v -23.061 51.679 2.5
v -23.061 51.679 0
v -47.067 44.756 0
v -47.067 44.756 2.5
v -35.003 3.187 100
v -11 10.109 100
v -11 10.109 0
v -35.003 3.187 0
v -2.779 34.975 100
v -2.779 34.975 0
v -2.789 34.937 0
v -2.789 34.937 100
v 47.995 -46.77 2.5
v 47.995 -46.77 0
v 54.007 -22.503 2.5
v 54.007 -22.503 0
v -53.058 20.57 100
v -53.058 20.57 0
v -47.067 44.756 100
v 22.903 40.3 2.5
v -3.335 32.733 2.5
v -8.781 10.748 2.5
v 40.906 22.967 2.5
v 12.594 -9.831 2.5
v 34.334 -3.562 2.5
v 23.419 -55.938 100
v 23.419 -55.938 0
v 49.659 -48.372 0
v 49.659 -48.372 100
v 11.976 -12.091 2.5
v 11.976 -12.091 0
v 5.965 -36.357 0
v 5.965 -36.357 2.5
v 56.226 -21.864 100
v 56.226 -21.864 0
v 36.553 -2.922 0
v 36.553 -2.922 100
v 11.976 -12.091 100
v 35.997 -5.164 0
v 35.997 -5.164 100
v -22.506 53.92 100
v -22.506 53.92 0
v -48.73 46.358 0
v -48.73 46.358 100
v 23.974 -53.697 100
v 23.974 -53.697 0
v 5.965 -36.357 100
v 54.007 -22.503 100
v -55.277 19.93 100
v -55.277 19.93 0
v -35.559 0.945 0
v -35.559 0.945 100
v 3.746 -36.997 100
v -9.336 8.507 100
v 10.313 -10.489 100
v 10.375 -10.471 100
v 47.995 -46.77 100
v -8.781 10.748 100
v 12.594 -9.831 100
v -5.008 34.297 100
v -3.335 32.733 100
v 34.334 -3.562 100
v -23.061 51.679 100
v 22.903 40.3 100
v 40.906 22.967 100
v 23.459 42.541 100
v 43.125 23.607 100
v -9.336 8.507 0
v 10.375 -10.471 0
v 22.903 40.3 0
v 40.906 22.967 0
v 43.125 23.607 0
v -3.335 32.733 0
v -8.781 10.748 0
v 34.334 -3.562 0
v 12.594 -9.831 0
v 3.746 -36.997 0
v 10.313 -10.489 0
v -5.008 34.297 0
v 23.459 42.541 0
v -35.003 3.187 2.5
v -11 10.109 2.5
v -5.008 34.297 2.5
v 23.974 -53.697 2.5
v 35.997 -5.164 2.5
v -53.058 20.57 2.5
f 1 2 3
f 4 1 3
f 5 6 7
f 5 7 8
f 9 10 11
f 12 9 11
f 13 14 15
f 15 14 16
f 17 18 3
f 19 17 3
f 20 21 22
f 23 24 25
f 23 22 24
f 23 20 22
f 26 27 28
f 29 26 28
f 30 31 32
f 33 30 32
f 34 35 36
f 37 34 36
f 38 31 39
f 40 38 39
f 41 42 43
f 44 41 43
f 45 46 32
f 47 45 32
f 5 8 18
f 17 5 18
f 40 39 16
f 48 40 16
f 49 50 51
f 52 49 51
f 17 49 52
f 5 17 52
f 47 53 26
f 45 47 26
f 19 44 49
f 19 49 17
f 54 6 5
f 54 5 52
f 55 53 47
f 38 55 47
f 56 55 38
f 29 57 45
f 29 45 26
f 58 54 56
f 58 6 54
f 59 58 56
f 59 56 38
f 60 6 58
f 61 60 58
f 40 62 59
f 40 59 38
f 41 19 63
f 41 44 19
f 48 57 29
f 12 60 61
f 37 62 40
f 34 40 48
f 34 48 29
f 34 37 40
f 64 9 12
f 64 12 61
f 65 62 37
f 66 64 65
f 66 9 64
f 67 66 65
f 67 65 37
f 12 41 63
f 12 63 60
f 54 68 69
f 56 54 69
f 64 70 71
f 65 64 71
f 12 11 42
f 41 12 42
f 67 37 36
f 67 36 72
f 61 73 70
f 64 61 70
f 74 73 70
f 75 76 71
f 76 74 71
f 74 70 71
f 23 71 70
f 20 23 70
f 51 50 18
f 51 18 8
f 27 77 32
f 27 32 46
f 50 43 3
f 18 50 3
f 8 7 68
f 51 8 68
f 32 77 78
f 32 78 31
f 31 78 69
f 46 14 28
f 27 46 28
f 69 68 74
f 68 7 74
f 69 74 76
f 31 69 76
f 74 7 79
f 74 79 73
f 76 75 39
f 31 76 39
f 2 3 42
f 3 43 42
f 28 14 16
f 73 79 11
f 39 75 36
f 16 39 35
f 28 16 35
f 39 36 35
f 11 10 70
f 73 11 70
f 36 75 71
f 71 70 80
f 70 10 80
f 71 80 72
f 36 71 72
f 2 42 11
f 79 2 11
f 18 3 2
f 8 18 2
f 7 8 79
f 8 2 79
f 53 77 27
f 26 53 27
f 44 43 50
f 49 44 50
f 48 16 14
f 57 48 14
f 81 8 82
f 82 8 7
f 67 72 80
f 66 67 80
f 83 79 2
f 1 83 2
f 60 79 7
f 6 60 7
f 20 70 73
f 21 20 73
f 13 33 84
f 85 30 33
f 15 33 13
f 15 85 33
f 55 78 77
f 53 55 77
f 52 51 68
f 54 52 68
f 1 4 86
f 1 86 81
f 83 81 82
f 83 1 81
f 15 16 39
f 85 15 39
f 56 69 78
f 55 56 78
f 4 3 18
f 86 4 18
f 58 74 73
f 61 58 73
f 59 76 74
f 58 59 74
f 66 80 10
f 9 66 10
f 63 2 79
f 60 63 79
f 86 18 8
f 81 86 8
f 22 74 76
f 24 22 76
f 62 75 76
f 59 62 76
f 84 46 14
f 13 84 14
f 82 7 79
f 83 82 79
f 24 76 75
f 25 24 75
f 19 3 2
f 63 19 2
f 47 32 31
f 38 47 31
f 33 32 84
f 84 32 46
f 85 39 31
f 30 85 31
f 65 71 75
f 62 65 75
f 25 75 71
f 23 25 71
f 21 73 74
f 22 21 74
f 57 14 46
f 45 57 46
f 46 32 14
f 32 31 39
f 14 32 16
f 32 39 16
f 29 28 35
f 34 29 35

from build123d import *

# Parameters (mm, degrees)
F1_DEPTH = 2.5
F2_DEPTH = 100


with BuildPart() as f1:
    # F0 (on Top) → F1 (new body)
    with BuildSketch(Plane.XY):
        Polygon((23.9740391848, -53.6968420277), (47.9952290893, -46.7699065169), (54.0069219188, -22.503478075), (35.9974248438, -5.163985144), (11.9762349393, -12.0909206548), (5.9645421098, -36.3573490966), align=None)
    extrude(amount=F1_DEPTH)


with BuildPart() as f1b:
    # F0 (on Top) → F1, piece 2 (new body)
    with BuildSketch(Plane.XY):
        Polygon((12.5938805561, -9.8313160485), (34.3337787663, -3.5622313982), (40.9060056961, 22.9668144158), (22.9034034312, 40.2996690431), (-3.3346036331, 32.7334750457), (-8.7811057818, 10.7484604419), align=None)
    extrude(amount=F1_DEPTH)


with BuildPart() as f1c:
    # F0 (on Top) → F1, piece 3 (new body)
    with BuildSketch(Plane.XY):
        Polygon((-35.0032359624, 3.1868448251), (-11.0000882551, 10.1085775488), (-5.0077850981, 34.2967388346), (-23.0612686958, 51.6785818655), (-47.0666128749, 44.7562157503), (-53.0583663292, 20.5702733605), align=None)
    extrude(amount=F1_DEPTH)


with BuildPart() as f2:
    # F0 (on Top) → F2 (new body)
    with BuildSketch(Plane.XY):
        Polygon((56.225904392, -21.8635951819), (36.5527612395, -2.9223485051), (34.3337787663, -3.5622313982), (12.5938805561, -9.8313160485), (10.3748980829, -10.4711989416), (10.3125888618, -10.489166909), (3.7455596365, -36.9972319897), (23.418702789, -55.9384786666), (49.6588751668, -48.3716602627), align=None)
        Polygon((54.0069219188, -22.503478075), (47.9952290893, -46.7699065169), (23.9740391848, -53.6968420277), (5.9645421098, -36.3573490966), (11.9762349393, -12.0909206548), (35.9974248438, -5.163985144), align=None, mode=Mode.SUBTRACT)
        Polygon((34.3337787663, -3.5622313982), (36.5527612395, -2.9223485051), (43.1249881693, 23.6066973089), (23.458739827, 42.541305682), (-2.7792672374, 34.9751116846), (-2.7888026249, 34.9366217277), (-3.3346036331, 32.7334750457), (22.9034034312, 40.2996690431), (40.9060056961, 22.9668144158), align=None)
        Polygon((10.3748980829, -10.4711989416), (12.5938805561, -9.8313160485), (-8.7811057818, 10.7484604419), (-9.3364421776, 8.506823803), align=None)
        Polygon((-9.3364421776, 8.506823803), (-8.7811057818, 10.7484604419), (-3.3346036331, 32.7334750457), (-2.7888026249, 34.9366217277), (-22.5059323001, 53.9202185044), (-48.7302589523, 46.3579694961), (-55.2773488024, 19.9303904674), (-35.5585723582, 0.9452081862), align=None)
        Polygon((-5.0077850981, 34.2967388346), (-11.0000882551, 10.1085775488), (-35.0032359624, 3.1868448251), (-53.0583663292, 20.5702733605), (-47.0666128749, 44.7562157503), (-23.0612686958, 51.6785818655), align=None, mode=Mode.SUBTRACT)
    extrude(amount=F2_DEPTH)


solid = Compound([f1.part, f1b.part, f1c.part, f2.part])
